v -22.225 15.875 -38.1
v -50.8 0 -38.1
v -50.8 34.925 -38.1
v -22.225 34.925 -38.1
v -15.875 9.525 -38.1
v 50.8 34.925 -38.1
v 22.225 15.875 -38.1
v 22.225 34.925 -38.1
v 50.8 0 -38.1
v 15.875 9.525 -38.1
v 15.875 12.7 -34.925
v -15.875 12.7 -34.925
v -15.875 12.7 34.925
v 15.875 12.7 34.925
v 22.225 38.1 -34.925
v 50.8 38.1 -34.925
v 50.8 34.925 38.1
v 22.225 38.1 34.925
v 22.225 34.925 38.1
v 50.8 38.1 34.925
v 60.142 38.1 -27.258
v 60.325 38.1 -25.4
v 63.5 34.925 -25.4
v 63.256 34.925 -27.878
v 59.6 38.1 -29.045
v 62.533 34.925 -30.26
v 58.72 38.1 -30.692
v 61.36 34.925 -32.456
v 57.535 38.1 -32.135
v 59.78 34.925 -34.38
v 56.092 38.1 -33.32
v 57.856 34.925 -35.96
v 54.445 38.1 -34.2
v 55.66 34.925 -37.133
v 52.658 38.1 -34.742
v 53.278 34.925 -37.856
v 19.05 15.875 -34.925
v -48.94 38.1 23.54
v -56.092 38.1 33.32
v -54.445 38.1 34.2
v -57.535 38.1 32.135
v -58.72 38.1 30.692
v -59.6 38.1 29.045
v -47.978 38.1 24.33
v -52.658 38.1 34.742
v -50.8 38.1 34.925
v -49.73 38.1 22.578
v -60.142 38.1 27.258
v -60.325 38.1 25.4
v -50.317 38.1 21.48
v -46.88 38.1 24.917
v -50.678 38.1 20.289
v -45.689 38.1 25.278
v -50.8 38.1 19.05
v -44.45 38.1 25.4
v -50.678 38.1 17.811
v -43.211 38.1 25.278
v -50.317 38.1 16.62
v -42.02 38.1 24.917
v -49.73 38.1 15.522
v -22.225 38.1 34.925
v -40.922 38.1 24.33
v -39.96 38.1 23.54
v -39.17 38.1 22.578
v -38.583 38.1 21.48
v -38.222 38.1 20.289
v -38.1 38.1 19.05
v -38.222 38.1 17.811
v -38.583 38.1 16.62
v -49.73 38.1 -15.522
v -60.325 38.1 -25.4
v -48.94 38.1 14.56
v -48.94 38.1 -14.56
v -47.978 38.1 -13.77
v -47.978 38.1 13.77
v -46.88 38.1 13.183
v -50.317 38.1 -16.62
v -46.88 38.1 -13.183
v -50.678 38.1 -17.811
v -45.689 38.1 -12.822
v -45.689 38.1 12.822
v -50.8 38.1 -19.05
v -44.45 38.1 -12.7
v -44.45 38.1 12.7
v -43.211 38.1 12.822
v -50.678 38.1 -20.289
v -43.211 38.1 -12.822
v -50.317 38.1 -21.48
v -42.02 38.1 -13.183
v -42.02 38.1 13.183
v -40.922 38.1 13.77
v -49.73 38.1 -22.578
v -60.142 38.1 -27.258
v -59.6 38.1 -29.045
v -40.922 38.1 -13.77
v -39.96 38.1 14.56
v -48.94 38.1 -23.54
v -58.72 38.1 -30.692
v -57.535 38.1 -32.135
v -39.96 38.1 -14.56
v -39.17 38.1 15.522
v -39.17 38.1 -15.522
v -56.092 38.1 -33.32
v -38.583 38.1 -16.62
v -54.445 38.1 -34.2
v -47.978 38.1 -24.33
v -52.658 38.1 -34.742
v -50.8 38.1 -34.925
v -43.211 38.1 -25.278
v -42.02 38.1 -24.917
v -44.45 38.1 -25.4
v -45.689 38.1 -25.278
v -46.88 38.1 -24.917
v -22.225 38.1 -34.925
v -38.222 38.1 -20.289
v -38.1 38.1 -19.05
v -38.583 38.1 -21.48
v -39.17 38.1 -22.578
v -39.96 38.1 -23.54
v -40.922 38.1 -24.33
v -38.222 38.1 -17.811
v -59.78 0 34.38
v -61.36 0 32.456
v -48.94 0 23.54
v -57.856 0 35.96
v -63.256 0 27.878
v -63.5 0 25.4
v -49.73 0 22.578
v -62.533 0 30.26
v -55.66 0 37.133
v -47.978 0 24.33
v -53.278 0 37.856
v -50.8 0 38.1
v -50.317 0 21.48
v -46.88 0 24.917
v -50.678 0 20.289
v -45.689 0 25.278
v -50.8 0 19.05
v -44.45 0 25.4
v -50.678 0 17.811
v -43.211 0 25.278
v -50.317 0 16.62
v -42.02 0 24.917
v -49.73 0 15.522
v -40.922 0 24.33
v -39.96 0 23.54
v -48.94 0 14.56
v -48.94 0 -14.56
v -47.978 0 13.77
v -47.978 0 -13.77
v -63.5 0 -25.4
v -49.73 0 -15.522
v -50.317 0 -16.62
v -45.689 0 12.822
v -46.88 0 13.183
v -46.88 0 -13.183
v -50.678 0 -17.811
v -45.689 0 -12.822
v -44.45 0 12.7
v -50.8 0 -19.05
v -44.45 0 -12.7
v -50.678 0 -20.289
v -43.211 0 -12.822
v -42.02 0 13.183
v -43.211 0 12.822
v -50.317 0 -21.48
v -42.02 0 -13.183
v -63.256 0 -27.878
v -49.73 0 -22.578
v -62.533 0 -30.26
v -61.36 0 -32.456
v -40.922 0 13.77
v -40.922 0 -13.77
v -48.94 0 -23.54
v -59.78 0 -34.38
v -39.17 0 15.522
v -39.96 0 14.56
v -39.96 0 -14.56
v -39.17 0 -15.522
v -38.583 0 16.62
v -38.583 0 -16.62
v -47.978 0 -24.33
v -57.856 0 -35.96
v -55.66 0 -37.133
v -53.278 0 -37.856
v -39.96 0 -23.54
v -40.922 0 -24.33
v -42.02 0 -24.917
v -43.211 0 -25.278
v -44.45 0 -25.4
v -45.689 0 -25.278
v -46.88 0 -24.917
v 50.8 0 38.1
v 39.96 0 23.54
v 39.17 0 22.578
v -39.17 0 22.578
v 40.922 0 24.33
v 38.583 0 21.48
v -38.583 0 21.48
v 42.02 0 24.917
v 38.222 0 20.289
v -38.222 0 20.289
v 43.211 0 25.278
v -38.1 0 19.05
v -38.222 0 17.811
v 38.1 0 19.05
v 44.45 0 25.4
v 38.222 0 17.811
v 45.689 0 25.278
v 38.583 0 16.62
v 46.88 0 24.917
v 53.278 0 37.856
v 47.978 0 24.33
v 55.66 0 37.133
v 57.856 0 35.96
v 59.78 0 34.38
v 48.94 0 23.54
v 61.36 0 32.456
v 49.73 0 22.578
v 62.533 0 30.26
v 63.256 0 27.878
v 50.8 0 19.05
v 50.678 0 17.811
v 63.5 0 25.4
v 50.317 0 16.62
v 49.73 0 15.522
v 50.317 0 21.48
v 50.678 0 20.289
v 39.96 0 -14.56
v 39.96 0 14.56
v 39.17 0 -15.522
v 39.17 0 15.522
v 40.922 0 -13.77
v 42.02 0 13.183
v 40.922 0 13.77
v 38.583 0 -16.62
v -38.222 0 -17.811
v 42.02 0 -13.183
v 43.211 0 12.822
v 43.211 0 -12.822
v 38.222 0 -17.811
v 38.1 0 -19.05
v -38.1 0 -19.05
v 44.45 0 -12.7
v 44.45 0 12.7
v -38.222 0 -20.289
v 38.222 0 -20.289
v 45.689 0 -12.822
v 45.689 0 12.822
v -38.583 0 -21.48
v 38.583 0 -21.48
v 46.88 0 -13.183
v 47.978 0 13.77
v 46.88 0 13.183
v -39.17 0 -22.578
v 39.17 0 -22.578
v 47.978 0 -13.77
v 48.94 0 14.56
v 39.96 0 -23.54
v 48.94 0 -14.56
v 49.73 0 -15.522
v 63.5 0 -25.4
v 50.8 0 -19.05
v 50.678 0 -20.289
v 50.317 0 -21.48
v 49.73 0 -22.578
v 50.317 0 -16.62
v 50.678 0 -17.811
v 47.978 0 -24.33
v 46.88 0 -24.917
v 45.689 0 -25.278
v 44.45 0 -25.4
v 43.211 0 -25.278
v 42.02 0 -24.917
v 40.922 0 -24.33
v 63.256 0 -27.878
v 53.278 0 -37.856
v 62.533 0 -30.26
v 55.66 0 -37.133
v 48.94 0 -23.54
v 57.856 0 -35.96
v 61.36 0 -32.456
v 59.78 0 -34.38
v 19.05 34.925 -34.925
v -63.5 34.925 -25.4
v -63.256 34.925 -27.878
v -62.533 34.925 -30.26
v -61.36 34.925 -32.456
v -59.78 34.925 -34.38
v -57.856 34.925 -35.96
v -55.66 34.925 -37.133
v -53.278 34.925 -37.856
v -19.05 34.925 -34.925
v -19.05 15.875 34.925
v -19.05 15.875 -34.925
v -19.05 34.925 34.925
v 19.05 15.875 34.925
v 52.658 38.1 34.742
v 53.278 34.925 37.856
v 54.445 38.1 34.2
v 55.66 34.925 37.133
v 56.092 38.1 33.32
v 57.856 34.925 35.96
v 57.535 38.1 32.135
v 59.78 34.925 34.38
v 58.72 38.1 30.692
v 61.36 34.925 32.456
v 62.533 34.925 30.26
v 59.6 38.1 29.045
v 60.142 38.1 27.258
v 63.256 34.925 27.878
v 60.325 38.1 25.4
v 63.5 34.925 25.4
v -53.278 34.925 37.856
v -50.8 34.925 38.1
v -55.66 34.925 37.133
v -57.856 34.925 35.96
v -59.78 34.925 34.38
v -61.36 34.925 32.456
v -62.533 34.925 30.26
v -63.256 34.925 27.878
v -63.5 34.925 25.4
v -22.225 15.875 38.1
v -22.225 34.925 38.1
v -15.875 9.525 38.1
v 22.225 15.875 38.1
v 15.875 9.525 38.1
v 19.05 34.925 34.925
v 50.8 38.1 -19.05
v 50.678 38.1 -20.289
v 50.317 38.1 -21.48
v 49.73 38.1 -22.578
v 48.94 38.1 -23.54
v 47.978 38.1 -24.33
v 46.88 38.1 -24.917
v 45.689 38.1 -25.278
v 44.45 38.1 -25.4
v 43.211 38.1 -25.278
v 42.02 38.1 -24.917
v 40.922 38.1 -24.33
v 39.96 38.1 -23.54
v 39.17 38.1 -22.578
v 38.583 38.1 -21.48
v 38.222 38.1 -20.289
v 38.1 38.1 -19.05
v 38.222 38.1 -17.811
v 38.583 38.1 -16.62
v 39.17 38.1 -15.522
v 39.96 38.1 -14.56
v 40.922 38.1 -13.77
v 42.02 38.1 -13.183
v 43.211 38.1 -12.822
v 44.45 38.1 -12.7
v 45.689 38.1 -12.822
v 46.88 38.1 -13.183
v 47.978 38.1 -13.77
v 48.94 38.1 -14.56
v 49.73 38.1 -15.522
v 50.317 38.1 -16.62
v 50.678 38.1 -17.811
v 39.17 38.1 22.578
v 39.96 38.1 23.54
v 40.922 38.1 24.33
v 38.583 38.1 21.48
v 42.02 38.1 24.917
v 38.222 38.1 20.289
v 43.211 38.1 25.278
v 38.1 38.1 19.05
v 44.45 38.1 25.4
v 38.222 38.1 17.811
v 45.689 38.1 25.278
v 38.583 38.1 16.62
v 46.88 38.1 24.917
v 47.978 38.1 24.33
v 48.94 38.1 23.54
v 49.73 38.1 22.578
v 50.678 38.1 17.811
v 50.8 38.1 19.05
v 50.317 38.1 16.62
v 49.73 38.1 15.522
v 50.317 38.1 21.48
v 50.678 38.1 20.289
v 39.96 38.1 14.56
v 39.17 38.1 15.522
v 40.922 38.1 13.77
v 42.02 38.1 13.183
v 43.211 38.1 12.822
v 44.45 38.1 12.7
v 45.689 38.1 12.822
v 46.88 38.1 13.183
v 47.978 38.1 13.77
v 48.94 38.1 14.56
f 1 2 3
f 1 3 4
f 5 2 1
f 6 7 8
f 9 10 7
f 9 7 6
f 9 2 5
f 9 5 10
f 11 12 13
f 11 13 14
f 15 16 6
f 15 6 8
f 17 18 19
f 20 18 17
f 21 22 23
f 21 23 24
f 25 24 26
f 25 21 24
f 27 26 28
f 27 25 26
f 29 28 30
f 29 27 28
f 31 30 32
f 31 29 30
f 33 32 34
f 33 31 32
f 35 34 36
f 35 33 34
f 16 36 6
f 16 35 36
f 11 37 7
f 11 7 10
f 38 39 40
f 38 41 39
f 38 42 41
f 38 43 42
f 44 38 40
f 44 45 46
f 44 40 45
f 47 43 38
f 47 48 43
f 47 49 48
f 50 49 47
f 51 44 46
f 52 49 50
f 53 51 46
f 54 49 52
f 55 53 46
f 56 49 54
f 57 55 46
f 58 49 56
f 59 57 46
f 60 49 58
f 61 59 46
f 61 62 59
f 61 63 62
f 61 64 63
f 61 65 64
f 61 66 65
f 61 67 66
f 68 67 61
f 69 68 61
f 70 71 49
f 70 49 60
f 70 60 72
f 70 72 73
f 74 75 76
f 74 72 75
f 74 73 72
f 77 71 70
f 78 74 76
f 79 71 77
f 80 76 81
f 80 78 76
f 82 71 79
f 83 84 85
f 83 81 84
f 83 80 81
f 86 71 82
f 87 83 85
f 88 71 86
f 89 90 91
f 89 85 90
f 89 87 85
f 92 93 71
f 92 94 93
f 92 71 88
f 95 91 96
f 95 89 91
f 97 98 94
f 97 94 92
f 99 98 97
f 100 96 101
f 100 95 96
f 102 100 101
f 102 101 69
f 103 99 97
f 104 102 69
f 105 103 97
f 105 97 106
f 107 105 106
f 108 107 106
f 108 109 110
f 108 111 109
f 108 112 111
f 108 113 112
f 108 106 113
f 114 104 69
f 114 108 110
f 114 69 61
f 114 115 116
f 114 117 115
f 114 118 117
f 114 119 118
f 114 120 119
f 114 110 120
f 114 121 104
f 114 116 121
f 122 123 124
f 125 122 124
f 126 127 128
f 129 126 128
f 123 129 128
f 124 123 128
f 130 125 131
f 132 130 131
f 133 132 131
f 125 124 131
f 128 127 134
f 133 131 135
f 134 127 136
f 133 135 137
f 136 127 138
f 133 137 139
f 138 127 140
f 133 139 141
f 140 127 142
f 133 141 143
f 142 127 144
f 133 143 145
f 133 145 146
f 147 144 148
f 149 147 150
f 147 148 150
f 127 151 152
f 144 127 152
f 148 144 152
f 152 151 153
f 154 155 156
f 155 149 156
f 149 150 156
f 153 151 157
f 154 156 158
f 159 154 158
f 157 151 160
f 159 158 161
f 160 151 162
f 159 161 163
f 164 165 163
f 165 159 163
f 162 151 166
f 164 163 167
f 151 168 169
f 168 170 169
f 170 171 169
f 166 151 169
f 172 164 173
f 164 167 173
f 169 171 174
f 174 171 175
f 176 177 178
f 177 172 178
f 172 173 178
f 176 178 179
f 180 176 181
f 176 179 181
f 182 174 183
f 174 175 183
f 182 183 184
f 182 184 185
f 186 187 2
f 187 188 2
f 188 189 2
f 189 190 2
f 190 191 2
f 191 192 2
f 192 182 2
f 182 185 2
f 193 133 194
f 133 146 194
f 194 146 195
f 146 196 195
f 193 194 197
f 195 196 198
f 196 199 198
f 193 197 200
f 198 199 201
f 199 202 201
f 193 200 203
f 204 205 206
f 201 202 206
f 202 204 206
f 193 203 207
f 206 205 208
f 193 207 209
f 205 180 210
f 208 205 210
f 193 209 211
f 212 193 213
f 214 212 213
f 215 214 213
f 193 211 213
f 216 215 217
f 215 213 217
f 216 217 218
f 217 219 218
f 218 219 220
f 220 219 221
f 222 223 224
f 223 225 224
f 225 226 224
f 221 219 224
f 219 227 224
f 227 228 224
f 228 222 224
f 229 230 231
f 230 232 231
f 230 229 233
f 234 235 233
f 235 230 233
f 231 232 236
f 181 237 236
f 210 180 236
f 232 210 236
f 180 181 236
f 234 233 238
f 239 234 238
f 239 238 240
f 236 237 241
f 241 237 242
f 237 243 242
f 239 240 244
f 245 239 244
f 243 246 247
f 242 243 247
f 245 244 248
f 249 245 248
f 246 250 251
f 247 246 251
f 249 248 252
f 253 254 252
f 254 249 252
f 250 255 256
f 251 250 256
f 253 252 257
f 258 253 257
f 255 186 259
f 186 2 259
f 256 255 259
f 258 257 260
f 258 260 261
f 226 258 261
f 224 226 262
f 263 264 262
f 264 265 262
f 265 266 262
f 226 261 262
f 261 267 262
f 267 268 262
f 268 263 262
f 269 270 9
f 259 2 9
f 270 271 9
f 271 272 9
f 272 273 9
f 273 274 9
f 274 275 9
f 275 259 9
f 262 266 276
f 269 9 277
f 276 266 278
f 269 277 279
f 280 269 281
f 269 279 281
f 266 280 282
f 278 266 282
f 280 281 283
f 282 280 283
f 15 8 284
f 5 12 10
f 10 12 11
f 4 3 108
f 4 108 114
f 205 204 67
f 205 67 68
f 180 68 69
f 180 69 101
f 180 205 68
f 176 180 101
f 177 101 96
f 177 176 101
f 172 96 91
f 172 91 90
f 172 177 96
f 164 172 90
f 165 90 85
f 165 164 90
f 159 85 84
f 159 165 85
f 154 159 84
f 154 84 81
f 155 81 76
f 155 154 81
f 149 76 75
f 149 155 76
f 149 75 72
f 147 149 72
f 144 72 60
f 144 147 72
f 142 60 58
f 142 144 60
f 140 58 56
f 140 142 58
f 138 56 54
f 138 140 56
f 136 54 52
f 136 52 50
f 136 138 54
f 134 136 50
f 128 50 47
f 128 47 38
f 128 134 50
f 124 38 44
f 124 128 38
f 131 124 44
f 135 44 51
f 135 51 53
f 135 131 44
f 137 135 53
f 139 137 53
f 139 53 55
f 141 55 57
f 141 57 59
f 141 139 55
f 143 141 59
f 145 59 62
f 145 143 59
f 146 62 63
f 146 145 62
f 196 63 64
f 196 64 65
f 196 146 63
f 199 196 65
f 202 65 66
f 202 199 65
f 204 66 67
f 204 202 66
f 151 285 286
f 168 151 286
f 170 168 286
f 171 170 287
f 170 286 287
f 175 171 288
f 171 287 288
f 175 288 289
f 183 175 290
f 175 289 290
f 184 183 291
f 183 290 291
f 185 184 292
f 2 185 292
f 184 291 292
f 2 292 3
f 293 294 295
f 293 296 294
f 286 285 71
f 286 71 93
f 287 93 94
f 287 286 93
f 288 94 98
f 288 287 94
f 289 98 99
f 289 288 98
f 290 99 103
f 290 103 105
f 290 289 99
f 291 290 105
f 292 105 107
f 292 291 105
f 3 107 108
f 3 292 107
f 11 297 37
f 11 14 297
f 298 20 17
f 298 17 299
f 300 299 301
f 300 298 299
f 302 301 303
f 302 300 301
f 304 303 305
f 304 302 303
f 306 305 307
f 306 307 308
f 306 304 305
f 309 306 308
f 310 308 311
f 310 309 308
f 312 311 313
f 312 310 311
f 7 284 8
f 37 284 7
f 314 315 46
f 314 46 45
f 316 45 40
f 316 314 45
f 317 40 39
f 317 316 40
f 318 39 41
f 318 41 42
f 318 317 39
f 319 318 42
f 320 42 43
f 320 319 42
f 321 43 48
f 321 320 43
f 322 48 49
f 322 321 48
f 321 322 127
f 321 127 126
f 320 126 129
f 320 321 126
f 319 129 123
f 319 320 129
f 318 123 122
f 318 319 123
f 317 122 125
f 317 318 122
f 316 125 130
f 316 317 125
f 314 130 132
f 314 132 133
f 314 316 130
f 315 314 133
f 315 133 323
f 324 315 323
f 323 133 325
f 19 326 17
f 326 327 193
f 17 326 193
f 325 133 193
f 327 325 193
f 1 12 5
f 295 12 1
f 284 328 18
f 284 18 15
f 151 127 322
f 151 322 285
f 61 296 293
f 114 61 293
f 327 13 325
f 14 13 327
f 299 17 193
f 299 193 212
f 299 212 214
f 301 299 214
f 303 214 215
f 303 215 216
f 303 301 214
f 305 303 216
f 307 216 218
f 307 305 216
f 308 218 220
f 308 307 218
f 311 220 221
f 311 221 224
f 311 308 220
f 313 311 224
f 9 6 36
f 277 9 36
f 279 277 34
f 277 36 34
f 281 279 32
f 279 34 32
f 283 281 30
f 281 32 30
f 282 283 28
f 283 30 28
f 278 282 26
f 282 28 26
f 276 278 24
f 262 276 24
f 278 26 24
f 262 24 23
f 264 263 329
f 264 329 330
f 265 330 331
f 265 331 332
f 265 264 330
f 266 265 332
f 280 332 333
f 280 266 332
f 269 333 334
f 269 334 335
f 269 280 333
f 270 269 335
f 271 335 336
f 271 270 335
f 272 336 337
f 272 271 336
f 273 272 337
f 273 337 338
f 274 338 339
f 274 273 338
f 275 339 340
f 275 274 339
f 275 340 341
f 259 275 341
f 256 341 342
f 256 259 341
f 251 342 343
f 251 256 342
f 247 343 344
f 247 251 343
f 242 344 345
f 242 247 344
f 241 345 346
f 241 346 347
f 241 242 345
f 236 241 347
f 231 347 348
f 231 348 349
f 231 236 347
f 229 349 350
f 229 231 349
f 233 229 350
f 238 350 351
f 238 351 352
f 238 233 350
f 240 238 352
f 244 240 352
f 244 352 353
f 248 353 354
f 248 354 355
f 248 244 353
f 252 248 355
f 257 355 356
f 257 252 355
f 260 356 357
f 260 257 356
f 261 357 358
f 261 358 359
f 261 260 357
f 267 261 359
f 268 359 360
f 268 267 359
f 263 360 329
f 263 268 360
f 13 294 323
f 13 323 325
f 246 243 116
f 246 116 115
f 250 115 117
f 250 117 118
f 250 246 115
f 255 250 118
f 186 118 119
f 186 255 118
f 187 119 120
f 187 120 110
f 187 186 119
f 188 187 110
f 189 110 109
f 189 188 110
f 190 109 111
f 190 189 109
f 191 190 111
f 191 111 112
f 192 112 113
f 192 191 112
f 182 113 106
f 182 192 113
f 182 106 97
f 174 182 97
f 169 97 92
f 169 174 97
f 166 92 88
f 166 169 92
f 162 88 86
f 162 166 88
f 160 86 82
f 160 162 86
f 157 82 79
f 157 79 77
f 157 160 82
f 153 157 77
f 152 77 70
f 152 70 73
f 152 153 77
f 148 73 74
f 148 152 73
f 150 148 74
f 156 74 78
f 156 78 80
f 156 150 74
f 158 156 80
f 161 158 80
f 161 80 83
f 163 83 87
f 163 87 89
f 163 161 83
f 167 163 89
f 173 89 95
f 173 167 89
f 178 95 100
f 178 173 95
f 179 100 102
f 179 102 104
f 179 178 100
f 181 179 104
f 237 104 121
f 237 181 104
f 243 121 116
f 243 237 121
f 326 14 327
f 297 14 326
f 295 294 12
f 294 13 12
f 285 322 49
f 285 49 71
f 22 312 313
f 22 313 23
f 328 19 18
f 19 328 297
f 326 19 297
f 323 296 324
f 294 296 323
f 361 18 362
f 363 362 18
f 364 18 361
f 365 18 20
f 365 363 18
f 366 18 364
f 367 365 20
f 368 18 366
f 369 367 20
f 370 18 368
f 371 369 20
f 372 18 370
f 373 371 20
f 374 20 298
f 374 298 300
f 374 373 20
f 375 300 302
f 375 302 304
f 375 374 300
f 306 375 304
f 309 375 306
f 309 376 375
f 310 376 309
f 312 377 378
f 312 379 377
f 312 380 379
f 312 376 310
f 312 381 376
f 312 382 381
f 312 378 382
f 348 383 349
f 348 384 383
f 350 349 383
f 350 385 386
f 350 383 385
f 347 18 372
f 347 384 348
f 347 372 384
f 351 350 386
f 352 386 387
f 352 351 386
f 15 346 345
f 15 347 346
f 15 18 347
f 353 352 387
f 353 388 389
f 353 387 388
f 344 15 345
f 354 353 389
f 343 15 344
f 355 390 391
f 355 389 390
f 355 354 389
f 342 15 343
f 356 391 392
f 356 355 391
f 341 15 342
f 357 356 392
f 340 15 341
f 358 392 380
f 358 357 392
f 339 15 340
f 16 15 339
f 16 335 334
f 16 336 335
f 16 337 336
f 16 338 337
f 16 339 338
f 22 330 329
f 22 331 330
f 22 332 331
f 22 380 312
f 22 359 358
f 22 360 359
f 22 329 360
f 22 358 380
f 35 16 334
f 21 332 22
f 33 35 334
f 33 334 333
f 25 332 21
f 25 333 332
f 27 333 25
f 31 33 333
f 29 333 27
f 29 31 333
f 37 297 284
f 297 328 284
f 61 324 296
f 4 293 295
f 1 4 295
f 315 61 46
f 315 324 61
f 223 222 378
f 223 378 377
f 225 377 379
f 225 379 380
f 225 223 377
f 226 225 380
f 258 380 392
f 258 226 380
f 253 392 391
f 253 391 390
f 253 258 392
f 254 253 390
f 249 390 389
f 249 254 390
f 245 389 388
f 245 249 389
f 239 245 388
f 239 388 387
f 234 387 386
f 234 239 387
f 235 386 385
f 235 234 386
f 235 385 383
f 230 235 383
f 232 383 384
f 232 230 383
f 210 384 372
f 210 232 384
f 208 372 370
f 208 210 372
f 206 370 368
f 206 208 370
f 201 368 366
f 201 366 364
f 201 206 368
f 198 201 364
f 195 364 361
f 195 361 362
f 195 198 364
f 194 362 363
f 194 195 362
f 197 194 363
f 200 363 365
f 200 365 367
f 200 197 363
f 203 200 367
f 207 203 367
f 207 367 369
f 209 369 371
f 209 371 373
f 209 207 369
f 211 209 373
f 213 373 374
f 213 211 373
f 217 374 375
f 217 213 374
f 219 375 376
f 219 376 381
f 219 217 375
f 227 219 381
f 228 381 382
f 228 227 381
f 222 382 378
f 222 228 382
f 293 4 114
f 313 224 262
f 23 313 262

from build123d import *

# Parameters (mm, degrees)
SKETCH2_W           = 127
SKETCH2_H           = 76.2
SKETCH2_R           = 6.35
BOSS_EXTRUDE1_DEPTH = 38.1
SKETCH3_W           = 38.1
SKETCH3_H           = 76.2
CUT_EXTRUDE1_DEPTH  = 25.4
FILLET1_R           = 12.7
CHAMFER1_SIZE       = 3.175


with BuildPart() as part:
    # Sketch2 → Boss-Extrude1 (new body)
    with BuildSketch(Plane(origin=(0, 0, 0), x_dir=(1, 0, 0), z_dir=(0, 1, 0))):
        Rectangle(SKETCH2_W, SKETCH2_H)
        with Locations((-44.45, 19.05)):
            Circle(SKETCH2_R, mode=Mode.SUBTRACT)
        with Locations((44.45, 19.05)):
            Circle(SKETCH2_R, mode=Mode.SUBTRACT)
        with Locations((44.45, -19.05)):
            Circle(SKETCH2_R, mode=Mode.SUBTRACT)
        with Locations((-44.45, -19.05)):
            Circle(SKETCH2_R, mode=Mode.SUBTRACT)
    extrude(amount=BOSS_EXTRUDE1_DEPTH)

    # Sketch3 → Cut-Extrude1 (cut)
    with BuildSketch(Plane(origin=(0, 38.1, 0), x_dir=(1, 0, 0), z_dir=(0, 1, 0))):
        Rectangle(SKETCH3_W, SKETCH3_H)
    extrude(amount=-CUT_EXTRUDE1_DEPTH, mode=Mode.SUBTRACT)

    # Fillet1
    fillet1_edges = [part.edges().sort_by_distance(p)[0] for p in [
        (63.5, 19.05, 38.1),
        (-63.5, 19.05, 38.1),
        (-63.5, 19.05, -38.1),
        (63.5, 19.05, -38.1),
    ]]
    fillet(fillet1_edges, radius=FILLET1_R)

    # Chamfer1
    chamfer1_edges = [part.edges().sort_by_distance(p)[0] for p in [
        (34.925, 38.1, 38.1),
        (-34.925, 38.1, -38.1),
        (19.05, 12.7, 0),
        (19.05, 25.4, -38.1),
        (0, 12.7, 38.1),
        (19.05, 25.4, 38.1),
        (-19.05, 12.7, 0),
        (-19.05, 25.4, 38.1),
        (0, 12.7, -38.1),
        (-19.05, 25.4, -38.1),
        (19.05, 38.1, 0),
        (-19.05, 38.1, 0),
        (-34.925, 38.1, 38.1),
        (-63.5, 38.1, 0),
        (-59.780256121, 38.1, -34.380256121),
        (-59.780256121, 38.1, 34.380256121),
        (34.925, 38.1, -38.1),
        (63.5, 38.1, 0),
        (59.780256121, 38.1, 34.380256121),
        (59.780256121, 38.1, -34.380256121),
    ]]
    chamfer(chamfer1_edges, length=CHAMFER1_SIZE)


solid = part.part
